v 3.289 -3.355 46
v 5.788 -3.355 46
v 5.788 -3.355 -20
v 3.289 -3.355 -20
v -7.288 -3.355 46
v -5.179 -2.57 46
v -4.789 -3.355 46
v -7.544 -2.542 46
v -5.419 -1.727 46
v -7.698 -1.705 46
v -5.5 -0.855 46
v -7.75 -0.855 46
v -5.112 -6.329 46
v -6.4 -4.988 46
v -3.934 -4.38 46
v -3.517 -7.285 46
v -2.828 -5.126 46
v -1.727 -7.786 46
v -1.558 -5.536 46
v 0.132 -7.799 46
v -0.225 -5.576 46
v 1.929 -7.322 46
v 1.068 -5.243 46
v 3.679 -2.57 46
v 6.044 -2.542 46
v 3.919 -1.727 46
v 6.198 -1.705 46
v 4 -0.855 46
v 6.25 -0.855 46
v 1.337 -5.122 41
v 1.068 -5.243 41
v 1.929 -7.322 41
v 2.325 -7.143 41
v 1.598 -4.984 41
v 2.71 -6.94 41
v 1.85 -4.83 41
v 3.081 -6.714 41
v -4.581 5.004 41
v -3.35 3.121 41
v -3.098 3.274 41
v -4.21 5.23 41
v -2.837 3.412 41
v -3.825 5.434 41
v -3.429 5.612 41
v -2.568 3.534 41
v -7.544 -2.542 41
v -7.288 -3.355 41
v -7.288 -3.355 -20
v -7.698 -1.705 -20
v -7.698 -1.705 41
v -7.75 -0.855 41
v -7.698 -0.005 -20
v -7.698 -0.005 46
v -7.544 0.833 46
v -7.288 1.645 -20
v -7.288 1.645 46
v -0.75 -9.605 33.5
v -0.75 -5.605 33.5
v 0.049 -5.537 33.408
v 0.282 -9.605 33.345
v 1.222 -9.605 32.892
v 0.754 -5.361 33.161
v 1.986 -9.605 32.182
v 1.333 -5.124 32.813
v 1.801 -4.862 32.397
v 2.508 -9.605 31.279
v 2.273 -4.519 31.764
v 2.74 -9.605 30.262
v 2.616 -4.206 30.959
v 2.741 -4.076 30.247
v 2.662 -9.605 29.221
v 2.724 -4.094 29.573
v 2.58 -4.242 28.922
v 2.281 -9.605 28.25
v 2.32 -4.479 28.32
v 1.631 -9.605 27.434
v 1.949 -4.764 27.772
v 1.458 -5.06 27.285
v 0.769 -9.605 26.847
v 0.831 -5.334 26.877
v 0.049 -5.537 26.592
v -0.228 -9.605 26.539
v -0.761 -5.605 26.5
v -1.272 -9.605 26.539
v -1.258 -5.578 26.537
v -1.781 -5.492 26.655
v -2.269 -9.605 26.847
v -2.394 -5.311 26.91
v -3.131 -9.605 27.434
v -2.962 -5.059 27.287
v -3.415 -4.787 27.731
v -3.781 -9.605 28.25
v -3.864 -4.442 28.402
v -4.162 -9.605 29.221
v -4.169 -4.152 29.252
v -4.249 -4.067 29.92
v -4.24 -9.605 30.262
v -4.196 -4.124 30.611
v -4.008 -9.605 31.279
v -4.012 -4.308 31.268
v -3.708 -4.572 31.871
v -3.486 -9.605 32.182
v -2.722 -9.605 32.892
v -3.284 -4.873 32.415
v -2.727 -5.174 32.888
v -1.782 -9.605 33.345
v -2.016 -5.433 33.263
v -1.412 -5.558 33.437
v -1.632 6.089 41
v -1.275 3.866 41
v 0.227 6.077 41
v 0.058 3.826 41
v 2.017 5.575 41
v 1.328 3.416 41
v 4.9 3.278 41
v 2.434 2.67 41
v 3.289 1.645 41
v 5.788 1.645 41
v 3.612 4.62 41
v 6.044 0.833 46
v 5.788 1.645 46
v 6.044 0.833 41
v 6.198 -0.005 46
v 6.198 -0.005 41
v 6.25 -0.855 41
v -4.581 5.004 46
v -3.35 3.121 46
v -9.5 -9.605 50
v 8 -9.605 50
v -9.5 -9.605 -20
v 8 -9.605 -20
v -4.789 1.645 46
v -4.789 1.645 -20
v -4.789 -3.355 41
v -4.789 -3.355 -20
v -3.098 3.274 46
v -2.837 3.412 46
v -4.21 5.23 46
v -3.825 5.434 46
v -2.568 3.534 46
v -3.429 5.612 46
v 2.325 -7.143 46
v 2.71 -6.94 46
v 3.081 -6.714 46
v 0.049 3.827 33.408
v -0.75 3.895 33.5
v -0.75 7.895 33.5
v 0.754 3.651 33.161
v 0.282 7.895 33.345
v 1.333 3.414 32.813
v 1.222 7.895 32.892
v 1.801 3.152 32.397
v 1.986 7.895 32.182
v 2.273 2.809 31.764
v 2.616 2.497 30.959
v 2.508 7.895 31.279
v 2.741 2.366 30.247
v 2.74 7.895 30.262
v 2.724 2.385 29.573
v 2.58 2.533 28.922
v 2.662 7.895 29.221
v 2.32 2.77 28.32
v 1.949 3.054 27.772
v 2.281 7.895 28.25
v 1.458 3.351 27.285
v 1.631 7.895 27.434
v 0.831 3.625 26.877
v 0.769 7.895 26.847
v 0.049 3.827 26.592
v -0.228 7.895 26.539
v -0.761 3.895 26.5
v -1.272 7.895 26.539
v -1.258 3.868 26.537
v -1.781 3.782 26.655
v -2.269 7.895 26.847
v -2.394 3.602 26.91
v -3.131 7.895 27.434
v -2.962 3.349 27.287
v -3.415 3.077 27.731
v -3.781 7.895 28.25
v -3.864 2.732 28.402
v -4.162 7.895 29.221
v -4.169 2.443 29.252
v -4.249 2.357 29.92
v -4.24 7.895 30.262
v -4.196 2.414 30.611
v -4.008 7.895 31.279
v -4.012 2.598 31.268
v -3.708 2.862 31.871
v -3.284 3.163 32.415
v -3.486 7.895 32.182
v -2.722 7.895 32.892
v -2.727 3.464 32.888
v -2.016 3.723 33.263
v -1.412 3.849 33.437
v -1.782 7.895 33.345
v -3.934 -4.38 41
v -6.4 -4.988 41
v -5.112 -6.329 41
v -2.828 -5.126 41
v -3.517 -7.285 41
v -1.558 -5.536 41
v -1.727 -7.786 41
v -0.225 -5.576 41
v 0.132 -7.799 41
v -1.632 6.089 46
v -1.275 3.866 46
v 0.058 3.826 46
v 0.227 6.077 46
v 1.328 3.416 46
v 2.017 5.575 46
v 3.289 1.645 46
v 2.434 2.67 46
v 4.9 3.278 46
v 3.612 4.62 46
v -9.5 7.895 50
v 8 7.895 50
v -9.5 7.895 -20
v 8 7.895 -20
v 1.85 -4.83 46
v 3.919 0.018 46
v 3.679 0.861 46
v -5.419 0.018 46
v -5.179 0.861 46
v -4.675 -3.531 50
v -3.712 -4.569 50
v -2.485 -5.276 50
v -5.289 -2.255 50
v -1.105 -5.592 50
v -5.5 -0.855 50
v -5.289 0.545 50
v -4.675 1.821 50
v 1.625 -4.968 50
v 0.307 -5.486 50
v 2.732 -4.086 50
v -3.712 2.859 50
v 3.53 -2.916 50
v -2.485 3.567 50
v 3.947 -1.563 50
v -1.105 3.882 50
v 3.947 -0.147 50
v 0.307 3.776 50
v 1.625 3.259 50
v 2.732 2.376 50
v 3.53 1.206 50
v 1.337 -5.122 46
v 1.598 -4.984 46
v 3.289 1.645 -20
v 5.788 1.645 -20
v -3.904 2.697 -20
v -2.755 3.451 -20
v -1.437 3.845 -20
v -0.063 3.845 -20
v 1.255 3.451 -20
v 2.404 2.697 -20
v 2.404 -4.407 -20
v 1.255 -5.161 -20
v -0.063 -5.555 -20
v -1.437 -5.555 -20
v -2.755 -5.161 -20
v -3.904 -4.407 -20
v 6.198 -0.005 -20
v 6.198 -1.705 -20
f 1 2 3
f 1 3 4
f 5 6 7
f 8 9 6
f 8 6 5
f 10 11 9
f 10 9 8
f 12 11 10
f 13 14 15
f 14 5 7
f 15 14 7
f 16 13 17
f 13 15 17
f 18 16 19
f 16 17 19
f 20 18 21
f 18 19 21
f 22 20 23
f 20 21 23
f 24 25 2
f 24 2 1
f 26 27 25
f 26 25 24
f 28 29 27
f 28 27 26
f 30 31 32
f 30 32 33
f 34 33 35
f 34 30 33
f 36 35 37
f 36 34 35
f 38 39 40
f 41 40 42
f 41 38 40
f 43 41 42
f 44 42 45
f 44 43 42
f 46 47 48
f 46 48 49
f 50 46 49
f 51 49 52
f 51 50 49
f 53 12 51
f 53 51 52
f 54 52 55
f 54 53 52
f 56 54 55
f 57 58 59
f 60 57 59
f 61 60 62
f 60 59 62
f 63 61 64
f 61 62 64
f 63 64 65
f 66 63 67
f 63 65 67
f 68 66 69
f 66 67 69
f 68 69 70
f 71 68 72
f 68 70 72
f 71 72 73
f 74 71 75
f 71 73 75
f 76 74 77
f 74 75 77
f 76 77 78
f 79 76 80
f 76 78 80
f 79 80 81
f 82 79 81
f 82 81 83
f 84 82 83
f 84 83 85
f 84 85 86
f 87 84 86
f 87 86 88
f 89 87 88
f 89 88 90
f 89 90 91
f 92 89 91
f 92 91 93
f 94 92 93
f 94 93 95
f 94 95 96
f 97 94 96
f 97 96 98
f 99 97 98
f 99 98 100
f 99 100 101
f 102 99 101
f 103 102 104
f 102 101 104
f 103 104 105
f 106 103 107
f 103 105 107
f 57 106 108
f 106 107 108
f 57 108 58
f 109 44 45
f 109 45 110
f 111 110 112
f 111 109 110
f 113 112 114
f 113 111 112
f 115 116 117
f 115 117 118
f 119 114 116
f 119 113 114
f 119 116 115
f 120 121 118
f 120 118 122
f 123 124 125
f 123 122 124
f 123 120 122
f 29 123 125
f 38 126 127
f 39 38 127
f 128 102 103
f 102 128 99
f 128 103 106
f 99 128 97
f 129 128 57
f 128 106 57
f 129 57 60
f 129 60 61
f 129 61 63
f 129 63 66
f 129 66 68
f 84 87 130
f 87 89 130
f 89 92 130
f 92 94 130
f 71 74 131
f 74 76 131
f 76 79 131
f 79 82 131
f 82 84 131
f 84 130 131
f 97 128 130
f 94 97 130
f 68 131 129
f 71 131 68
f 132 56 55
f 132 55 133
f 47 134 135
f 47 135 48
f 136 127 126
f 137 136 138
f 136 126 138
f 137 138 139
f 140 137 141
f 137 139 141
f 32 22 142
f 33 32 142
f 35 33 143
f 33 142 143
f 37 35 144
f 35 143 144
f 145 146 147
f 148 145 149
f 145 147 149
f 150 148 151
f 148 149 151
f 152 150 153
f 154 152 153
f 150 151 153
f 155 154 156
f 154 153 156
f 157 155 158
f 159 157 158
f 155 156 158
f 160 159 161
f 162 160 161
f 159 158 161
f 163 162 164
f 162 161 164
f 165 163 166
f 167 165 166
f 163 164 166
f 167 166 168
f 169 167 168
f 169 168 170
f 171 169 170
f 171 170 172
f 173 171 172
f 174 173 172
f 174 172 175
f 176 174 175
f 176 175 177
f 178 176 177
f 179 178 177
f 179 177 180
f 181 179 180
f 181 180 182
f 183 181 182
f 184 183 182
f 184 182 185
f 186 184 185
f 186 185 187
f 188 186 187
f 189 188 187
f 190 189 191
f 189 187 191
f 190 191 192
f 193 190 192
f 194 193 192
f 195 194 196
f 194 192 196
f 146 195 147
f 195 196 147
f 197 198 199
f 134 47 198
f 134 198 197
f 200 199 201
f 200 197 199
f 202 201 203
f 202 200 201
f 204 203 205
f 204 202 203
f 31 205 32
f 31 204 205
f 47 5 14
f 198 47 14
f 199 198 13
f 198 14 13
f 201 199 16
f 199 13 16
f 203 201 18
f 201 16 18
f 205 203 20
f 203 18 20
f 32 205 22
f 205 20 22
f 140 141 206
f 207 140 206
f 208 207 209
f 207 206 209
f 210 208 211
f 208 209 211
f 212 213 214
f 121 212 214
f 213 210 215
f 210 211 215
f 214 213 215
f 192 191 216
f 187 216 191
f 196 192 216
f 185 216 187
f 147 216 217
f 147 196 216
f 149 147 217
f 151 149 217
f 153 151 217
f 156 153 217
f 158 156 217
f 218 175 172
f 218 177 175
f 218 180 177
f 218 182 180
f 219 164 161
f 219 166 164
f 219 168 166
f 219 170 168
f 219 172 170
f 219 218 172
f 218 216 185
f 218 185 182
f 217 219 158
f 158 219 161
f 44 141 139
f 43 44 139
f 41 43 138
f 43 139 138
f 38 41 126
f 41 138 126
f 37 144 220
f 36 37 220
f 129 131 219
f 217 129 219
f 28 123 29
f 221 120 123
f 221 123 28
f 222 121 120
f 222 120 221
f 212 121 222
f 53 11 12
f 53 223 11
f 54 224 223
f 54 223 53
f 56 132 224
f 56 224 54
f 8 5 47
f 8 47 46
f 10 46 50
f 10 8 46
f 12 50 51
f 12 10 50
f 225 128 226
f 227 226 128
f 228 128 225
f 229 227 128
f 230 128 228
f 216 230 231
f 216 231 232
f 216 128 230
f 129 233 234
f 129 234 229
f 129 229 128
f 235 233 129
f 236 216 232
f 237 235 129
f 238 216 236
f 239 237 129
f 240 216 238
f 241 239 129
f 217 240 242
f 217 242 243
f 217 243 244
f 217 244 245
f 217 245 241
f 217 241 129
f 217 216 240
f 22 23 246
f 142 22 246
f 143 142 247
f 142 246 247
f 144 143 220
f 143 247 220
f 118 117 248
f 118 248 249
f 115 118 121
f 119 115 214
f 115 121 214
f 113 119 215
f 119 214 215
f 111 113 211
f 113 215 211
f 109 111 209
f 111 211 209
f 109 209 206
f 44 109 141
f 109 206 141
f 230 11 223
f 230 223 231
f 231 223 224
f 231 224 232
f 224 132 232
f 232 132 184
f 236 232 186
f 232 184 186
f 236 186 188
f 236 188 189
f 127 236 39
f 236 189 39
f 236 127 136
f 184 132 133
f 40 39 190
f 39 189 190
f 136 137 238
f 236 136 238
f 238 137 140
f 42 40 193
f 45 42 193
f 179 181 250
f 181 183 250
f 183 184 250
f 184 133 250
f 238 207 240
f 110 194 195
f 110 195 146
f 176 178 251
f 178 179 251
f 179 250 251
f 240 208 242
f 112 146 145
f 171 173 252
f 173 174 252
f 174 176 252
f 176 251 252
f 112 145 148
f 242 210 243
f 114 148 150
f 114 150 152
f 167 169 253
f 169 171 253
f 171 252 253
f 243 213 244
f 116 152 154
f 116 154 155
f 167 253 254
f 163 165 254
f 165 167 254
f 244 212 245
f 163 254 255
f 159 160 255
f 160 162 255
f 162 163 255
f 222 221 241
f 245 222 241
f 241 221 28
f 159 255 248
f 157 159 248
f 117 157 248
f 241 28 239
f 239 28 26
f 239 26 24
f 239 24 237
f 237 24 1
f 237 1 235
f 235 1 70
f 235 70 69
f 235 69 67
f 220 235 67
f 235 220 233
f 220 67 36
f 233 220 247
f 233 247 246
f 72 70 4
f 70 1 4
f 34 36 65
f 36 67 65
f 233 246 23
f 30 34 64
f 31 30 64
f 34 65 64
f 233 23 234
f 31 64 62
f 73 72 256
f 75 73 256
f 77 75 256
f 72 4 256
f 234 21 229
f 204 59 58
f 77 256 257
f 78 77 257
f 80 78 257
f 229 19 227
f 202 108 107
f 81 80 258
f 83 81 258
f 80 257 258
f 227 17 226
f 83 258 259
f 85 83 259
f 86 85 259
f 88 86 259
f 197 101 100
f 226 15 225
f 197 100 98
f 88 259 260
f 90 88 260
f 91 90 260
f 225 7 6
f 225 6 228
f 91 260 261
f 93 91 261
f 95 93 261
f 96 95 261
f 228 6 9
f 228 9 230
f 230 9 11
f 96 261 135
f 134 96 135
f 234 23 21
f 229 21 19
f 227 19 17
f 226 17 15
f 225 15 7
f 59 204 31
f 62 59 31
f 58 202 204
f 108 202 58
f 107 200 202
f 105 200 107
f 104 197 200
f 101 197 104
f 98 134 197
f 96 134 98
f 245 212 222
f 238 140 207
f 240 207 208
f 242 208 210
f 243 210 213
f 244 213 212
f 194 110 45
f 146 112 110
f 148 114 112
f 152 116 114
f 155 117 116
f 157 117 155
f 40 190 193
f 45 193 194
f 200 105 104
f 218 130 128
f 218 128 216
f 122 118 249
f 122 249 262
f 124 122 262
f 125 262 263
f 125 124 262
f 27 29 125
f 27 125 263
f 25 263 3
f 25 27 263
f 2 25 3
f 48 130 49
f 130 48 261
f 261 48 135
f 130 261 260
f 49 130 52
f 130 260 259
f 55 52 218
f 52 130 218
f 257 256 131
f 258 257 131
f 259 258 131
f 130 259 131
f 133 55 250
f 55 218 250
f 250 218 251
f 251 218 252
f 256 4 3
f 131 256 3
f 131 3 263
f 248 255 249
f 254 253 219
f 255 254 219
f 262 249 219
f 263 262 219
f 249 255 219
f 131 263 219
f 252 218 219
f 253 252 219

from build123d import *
from build123d.topology import SkipClean

# Parameters (mm, degrees)
BOSS_EXTRUDE1_START = -20
SKETCH1_W           = 17.5
SKETCH1_H           = 17.5
BOSS_EXTRUDE1_DEPTH = 70
SKETCH2_R           = 4.75
CUT_EXTRUDE1_DEPTH  = 150
SKETCH3_R           = 3.5
CUT_EXTRUDE6_DEPTH  = 25
CUT_EXTRUDE9_START  = -4
CUT_EXTRUDE9_DEPTH  = 66
CUT_EXTRUDE13_START = -4
CUT_EXTRUDE13_DEPTH = 5


with BuildPart() as part:
    # Sketch1 → Boss-Extrude1 (new body)
    with BuildSketch(Plane.XY.offset(BOSS_EXTRUDE1_START)):
        with Locations((-0.75, -0.85483871)):
            Rectangle(SKETCH1_W, SKETCH1_H)
    extrude(amount=BOSS_EXTRUDE1_DEPTH)

    # Sketch2 → Cut-Extrude1 (cut)
    with BuildSketch(Plane(origin=(0, 0, -20), x_dir=(-1, 0, 0), z_dir=(0, 0, -1))):
        with Locations((0.75, -0.85483871)):
            Circle(SKETCH2_R)
    extrude(amount=-CUT_EXTRUDE1_DEPTH, mode=Mode.SUBTRACT)

    # Sketch3 → Cut-Extrude6 (cut)
    with BuildSketch(Plane(origin=(0, 7.89516129, 0), x_dir=(1, 0, 0), z_dir=(0, 1, 0))):
        with Locations(Location((-0.75, -30, 0), (0, 0, 270))):
            Circle(SKETCH3_R)
    extrude(amount=-CUT_EXTRUDE6_DEPTH, mode=Mode.SUBTRACT)

    # Sketch6 → Cut-Extrude9 (cut)
    with BuildSketch(Plane.XY.offset(50).offset(CUT_EXTRUDE9_START)):
        with BuildLine():
            Line((-7.288348415, 1.64516129), (5.788348415, 1.64516129))
            ThreePointArc((5.788348415, 1.64516129), (6.25, -0.85483871), (5.788348415, -3.35483871))
            Line((5.788348415, -3.35483871), (-7.288348415, -3.35483871))
            ThreePointArc((-7.288348415, -3.35483871), (-7.75, -0.85483871), (-7.288348415, 1.64516129))
        make_face()
    extrude(amount=-CUT_EXTRUDE9_DEPTH, mode=Mode.SUBTRACT)

    # Sketch4 → Cut-Extrude13 (cut)
    with SkipClean():  # the faces are left unmerged after this step: merging them gives an invalid solid
        with BuildSketch(Plane.XY.offset(50).offset(CUT_EXTRUDE13_START)):
            with BuildLine():
                ThreePointArc((1.849543844, -4.830372863), (1.468272605, -5.05504902), (1.067746304, -5.243266489))
                Line((1.067746304, -5.243266489), (1.928784027, -7.321995437))
                ThreePointArc((1.928784027, -7.321995437), (2.519033312, -7.044622325), (3.080906718, -6.71352062))
                Line((3.080906718, -6.71352062), (1.849543844, -4.830372863))
            make_face()
            with BuildLine():
                ThreePointArc((1.067746304, -5.243266489), (-3.388958607, -4.804319368), (-5.5, -0.85483871))
                Line((-5.5, -0.85483871), (-7.75, -0.85483871))
                ThreePointArc((-7.75, -0.85483871), (-4.638991631, -6.675125996), (1.928784027, -7.321995437))
                Line((1.928784027, -7.321995437), (1.067746304, -5.243266489))
            make_face()
            with BuildLine():
                ThreePointArc((-3.349543844, 3.120695443), (-2.968272605, 3.345371601), (-2.567746304, 3.53358907))
                Line((-2.567746304, 3.53358907), (-3.428784027, 5.612318018))
                ThreePointArc((-3.428784027, 5.612318018), (-4.019033312, 5.334944906), (-4.580906718, 5.0038432))
                Line((-4.580906718, 5.0038432), (-3.349543844, 3.120695443))
            make_face()
            with BuildLine():
                ThreePointArc((-2.567746304, 3.53358907), (1.888958607, 3.094641949), (4, -0.85483871))
                Line((4, -0.85483871), (6.25, -0.85483871))
                ThreePointArc((6.25, -0.85483871), (3.138991631, 4.965448576), (-3.428784027, 5.612318018))
                Line((-3.428784027, 5.612318018), (-2.567746304, 3.53358907))
            make_face()
        extrude(amount=-CUT_EXTRUDE13_DEPTH, mode=Mode.SUBTRACT)


solid = part.part
